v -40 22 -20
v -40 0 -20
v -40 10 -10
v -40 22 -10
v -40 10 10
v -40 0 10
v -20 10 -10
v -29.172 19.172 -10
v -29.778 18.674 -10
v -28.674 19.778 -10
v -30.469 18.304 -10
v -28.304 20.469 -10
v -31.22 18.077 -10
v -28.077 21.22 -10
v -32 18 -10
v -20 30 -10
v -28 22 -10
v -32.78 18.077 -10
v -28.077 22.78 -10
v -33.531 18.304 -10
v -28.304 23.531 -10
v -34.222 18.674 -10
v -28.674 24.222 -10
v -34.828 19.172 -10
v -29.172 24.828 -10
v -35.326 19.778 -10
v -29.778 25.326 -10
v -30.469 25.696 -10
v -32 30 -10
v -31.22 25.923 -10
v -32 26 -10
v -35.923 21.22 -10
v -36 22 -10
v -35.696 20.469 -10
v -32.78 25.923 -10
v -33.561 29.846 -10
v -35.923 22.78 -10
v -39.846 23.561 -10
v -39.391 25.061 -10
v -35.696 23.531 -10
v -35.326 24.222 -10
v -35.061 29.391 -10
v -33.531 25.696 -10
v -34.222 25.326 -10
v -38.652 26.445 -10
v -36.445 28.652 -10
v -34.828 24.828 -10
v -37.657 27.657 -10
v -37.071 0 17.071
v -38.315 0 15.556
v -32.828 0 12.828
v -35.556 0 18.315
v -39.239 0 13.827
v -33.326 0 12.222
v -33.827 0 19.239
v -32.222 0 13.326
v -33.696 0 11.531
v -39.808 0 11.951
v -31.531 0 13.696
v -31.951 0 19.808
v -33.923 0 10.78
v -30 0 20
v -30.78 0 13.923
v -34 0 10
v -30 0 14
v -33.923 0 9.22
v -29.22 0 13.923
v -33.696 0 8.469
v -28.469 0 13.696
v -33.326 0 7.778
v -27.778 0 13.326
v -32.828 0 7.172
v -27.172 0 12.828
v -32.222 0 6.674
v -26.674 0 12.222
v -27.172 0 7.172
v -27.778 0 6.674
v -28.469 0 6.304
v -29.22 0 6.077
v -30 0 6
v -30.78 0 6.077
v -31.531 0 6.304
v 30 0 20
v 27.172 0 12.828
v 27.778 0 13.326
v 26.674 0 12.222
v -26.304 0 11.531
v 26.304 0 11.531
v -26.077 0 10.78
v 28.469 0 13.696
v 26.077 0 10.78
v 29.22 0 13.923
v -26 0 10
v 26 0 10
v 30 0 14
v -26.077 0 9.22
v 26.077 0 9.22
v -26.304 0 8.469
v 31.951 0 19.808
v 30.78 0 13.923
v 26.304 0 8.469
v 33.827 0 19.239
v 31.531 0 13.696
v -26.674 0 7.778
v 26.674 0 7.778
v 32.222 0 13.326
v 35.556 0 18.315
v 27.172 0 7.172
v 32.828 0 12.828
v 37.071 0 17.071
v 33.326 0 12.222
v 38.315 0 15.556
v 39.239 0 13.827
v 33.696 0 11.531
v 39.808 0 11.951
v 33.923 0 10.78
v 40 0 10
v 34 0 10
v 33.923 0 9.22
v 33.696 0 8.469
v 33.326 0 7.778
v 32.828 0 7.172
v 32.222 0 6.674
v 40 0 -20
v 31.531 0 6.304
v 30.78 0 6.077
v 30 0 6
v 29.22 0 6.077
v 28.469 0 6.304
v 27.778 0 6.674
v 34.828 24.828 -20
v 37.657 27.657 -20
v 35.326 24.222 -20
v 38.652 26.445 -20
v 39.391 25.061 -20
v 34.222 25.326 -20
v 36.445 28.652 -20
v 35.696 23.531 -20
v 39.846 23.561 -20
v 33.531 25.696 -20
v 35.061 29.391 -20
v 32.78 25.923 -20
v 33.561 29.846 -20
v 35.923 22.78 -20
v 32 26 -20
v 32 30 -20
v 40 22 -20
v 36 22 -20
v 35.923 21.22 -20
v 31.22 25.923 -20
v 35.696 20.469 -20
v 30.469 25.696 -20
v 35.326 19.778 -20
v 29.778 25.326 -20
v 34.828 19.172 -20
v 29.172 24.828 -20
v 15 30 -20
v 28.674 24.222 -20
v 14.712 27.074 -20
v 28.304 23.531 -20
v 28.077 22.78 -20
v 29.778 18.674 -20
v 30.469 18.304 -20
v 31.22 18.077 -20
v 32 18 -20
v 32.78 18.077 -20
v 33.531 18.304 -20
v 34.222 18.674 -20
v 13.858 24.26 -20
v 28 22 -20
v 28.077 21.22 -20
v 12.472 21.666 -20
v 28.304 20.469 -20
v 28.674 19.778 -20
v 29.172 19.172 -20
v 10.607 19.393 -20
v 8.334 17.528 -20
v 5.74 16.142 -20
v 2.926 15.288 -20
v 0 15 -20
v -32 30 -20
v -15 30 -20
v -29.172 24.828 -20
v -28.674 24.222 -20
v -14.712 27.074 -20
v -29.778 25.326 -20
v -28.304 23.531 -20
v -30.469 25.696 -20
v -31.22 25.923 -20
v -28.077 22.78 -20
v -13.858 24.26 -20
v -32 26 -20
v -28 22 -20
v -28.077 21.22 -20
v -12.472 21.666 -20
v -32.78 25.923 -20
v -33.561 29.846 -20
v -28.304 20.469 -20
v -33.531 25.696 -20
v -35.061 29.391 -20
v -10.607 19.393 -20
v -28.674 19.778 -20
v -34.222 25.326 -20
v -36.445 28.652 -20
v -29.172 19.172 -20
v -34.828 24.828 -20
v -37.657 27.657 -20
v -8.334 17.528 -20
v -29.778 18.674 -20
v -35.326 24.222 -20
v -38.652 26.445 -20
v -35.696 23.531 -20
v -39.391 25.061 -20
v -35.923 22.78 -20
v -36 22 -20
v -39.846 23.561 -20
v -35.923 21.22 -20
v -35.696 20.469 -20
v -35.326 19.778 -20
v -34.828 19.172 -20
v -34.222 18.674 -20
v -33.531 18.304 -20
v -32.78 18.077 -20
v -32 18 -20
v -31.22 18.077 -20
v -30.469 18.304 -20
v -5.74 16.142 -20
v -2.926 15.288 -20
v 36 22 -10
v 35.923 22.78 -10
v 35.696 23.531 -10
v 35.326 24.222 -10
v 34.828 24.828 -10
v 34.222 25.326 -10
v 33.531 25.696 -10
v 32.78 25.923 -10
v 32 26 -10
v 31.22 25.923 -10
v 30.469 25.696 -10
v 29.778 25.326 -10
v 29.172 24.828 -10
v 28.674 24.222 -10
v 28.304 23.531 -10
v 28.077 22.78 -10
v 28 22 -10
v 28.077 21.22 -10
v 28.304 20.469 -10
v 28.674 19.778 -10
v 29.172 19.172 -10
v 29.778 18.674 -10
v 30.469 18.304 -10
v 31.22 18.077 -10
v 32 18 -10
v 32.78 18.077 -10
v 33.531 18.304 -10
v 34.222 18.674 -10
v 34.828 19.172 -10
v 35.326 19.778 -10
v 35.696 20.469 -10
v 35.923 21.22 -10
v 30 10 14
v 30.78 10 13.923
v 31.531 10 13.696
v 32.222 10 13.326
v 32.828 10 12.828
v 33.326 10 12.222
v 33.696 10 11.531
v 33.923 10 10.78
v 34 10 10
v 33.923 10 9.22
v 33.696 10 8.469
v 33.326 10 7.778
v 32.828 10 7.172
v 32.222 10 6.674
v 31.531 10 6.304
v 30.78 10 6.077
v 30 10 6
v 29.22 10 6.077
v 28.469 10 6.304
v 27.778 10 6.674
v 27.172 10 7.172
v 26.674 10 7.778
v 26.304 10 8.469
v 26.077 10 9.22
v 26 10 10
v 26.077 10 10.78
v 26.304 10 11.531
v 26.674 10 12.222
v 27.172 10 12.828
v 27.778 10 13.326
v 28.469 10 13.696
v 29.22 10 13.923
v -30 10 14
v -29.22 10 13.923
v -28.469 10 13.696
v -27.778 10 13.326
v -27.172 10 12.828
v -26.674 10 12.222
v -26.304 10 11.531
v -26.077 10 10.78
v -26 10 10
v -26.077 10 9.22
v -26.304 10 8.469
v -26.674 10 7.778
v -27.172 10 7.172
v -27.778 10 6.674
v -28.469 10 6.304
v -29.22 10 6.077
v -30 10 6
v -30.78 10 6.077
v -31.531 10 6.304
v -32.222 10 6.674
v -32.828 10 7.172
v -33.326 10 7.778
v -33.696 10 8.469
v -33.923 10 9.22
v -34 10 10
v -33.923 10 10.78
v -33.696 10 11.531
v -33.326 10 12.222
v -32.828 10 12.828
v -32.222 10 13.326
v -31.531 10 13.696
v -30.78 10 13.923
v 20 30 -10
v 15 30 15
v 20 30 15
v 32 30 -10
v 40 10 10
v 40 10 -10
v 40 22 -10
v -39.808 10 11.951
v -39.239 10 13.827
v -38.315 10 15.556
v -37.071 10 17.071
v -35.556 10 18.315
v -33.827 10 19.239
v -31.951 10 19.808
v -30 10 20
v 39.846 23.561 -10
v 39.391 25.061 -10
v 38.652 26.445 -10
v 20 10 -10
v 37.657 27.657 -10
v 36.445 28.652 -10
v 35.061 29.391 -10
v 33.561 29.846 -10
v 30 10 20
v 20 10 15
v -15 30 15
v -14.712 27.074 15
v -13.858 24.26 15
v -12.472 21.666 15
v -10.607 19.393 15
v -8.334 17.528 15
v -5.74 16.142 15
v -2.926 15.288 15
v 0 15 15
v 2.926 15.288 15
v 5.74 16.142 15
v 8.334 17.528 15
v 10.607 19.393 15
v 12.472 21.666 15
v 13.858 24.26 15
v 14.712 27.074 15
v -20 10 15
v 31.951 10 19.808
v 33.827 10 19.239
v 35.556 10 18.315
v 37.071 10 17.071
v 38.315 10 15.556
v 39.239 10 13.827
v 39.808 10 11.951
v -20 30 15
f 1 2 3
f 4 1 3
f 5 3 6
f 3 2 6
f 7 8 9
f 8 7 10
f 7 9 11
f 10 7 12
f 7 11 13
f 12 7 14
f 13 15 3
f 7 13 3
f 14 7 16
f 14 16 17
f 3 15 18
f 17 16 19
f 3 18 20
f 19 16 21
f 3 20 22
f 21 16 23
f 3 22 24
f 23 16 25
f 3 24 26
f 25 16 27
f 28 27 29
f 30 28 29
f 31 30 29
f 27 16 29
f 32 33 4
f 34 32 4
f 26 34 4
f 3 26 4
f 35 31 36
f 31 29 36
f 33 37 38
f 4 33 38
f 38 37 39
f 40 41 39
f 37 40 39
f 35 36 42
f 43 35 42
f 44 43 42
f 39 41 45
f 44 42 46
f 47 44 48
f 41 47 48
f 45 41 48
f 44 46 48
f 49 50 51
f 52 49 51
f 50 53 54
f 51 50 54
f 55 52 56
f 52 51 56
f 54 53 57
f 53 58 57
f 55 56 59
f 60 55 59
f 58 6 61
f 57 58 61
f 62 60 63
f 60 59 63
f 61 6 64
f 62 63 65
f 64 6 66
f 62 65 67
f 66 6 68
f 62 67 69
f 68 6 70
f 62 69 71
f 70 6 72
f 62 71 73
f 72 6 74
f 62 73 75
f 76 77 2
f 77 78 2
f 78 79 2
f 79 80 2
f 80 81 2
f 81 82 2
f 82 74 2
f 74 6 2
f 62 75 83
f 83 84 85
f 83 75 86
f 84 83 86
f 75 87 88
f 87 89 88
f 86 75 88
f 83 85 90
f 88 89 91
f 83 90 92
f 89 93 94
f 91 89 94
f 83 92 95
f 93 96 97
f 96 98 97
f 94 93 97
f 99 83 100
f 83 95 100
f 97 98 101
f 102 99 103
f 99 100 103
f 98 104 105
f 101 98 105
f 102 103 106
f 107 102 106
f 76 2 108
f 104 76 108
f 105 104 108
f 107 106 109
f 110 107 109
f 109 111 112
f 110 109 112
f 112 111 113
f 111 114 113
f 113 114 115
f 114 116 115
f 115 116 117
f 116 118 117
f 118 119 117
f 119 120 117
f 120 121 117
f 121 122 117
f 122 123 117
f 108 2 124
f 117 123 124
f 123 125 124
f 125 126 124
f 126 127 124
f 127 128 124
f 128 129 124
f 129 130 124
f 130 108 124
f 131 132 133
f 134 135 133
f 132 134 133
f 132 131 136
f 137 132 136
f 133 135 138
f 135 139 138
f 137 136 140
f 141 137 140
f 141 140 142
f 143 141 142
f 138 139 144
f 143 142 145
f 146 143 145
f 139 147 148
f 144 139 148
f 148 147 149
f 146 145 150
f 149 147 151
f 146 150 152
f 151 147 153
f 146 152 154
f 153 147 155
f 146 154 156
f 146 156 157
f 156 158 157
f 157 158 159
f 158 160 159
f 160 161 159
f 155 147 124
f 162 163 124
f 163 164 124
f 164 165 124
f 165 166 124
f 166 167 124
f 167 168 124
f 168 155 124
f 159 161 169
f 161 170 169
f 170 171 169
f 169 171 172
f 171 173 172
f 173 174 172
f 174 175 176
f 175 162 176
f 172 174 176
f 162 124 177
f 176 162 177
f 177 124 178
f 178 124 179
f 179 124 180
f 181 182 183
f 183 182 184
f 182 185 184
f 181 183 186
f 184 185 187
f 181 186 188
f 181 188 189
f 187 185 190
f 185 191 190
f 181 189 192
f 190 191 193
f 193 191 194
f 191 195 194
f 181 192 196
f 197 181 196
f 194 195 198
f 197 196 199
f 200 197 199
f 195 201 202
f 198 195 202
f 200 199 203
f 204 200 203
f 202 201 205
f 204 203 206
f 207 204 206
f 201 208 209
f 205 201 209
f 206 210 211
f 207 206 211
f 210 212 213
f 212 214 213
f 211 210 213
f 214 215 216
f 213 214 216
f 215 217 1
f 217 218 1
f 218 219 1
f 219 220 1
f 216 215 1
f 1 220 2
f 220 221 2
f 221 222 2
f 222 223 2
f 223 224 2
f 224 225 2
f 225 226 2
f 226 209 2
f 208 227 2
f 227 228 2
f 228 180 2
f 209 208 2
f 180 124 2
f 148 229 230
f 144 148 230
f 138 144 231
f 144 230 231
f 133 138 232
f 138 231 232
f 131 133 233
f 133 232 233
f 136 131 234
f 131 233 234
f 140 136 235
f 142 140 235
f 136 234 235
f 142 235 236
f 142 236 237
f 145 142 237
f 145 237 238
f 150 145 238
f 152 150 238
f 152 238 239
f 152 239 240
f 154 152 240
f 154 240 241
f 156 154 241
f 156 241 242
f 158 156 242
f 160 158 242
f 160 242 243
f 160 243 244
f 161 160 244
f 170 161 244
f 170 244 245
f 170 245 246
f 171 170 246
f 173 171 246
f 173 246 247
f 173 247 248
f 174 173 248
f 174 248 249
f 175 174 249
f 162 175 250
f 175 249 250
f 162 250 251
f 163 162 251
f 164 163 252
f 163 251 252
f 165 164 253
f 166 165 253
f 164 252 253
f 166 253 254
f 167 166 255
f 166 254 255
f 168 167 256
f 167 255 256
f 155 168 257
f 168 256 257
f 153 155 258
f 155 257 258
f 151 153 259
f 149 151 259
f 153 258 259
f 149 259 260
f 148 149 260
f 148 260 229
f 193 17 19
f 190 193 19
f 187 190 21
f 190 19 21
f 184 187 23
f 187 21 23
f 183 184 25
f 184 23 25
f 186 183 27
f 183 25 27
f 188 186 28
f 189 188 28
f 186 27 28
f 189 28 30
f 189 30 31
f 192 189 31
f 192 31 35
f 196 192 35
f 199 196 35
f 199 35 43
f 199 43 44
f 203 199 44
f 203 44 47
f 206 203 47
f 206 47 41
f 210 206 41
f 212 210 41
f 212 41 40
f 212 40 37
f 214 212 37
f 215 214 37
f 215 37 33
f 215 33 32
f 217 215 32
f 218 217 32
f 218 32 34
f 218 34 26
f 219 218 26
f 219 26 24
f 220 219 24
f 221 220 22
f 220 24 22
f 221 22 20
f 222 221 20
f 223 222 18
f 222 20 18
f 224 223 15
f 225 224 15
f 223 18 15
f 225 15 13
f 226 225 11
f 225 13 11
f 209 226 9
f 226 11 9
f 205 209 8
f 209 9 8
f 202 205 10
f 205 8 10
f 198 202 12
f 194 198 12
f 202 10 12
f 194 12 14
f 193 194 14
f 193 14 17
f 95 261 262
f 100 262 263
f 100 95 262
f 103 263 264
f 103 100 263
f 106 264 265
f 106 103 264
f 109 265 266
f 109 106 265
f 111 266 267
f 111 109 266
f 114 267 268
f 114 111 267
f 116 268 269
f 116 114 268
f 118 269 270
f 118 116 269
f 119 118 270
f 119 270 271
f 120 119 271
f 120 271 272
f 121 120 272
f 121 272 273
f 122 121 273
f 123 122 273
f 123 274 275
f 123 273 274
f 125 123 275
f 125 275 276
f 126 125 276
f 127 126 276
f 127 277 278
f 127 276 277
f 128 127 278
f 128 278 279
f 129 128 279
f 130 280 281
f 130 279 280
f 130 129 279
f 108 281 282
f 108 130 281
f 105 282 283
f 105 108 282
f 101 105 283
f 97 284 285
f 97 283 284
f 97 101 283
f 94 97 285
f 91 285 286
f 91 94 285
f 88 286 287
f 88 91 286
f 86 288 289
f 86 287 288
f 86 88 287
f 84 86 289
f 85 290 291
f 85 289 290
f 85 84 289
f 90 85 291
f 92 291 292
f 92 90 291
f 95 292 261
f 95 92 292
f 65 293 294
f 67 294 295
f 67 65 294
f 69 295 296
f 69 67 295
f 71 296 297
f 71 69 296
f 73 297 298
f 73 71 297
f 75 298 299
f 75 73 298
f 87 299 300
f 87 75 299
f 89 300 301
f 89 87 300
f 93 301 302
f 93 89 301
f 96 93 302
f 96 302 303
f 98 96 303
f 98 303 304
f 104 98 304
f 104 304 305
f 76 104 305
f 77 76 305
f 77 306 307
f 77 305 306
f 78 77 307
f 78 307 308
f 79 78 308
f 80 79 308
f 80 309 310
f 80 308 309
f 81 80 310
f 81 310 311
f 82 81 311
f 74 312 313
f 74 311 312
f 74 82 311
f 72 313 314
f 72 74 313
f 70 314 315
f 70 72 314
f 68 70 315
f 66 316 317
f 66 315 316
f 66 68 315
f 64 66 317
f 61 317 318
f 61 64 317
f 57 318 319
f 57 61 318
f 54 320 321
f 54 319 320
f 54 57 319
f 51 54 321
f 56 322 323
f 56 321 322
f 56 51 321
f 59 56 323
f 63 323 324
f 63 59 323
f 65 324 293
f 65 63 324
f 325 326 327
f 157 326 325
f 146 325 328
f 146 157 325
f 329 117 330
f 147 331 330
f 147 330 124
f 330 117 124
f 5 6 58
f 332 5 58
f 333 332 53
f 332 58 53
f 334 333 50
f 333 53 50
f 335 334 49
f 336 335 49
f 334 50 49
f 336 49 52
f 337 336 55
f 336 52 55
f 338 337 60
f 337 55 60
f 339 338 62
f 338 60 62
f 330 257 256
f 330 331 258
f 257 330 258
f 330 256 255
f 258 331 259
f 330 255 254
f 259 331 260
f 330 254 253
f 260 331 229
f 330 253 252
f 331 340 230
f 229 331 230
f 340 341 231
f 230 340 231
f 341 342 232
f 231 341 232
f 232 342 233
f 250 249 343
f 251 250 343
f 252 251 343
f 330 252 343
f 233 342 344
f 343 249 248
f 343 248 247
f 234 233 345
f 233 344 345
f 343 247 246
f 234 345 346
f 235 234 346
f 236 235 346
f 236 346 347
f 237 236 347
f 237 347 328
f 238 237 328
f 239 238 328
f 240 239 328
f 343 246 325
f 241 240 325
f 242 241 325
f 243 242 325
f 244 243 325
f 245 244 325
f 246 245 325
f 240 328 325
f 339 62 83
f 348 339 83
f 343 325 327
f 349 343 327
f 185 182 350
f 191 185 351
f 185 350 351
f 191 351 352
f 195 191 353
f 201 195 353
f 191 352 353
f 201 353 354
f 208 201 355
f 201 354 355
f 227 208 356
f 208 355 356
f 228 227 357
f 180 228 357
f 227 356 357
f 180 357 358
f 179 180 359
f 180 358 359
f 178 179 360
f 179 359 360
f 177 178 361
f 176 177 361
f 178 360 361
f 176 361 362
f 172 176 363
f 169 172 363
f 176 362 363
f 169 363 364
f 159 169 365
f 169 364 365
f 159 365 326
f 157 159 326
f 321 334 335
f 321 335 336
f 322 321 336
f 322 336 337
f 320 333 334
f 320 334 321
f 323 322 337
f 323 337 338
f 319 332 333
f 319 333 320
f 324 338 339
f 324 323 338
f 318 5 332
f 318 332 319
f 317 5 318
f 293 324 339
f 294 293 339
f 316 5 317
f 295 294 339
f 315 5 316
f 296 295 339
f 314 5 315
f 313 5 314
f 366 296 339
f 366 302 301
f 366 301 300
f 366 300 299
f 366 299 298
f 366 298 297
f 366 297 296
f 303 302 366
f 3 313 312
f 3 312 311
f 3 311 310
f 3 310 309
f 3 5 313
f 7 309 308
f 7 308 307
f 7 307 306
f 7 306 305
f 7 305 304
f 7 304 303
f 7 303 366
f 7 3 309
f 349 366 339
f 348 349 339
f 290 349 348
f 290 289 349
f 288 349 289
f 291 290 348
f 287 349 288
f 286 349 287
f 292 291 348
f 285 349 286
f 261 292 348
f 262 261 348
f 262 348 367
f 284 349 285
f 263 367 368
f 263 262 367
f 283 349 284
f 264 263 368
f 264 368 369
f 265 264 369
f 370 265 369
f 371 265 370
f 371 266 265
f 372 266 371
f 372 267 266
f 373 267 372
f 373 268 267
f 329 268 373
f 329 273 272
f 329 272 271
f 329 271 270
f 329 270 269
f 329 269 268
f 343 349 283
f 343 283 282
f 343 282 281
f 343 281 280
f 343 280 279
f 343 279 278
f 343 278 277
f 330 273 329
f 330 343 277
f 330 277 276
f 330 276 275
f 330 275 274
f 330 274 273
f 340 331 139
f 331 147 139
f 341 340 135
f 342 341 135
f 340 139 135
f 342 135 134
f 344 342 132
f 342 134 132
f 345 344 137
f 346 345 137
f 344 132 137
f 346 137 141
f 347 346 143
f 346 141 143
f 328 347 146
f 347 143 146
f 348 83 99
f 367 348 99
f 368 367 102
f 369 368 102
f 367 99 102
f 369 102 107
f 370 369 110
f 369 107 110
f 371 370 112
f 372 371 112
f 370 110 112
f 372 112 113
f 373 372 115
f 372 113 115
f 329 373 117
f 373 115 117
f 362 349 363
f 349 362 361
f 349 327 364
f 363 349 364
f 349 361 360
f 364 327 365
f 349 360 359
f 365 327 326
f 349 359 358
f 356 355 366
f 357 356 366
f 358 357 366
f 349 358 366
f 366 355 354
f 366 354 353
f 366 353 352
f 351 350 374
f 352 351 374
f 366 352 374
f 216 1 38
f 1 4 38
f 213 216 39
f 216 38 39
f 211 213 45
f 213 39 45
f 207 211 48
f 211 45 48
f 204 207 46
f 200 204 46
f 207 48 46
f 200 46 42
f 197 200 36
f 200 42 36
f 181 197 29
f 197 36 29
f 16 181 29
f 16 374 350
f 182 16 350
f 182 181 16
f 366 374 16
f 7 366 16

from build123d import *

# Parameters (mm, degrees)
SKETCH_1_R          = 4
EXTRUDE_1_DEPTH     = 30
CUT_EXTRUDE_1_DEPTH = 20
FILLET_1_R          = 8
SKETCH_3_R          = 4
CUT_EXTRUDE_2_DEPTH = 41


with BuildPart() as part:
    # 스케치1 → 보스-돌출1 (new body)
    with BuildSketch(Plane(origin=(0, 0, 0), x_dir=(1, 0, 0), z_dir=(0, 1, 0))):
        with BuildLine():
            Line((-30, -20), (30, -20))
            ThreePointArc((30, -20), (37.071067812, -17.071067812), (40, -10))
            Line((40, -10), (40, 20))
            Line((40, 20), (-40, 20))
            Line((-40, 20), (-40, -10))
            ThreePointArc((-40, -10), (-37.071067812, -17.071067812), (-30, -20))
        make_face()
        with Locations(Location((-30, -10, 0), (0, 0, 270))):  # turned: the seam where the file's is
            Circle(SKETCH_1_R, mode=Mode.SUBTRACT)
        with Locations(Location((30, -10, 0), (0, 0, 270))):  # turned: the seam where the file's is
            Circle(SKETCH_1_R, mode=Mode.SUBTRACT)
    extrude(amount=EXTRUDE_1_DEPTH)

    # 스케치2 → 컷-돌출1 (cut)
    with BuildSketch(Plane(origin=(0, 30, 0), x_dir=(1, 0, 0), z_dir=(0, 1, 0))):
        with BuildLine():
            Line((40, -10), (40, 10))
            Line((40, 10), (20, 10))
            Line((20, 10), (20, -15))
            Line((20, -15), (-20, -15))
            Line((-20, -15), (-20, 10))
            Line((-20, 10), (-40, 10))
            Line((-40, 10), (-40, -10))
            ThreePointArc((-40, -10), (-37.071067812, -17.071067812), (-30, -20))
            Line((-30, -20), (30, -20))
            ThreePointArc((30, -20), (37.071067812, -17.071067812), (40, -10))
        make_face()
    extrude(amount=-CUT_EXTRUDE_1_DEPTH, mode=Mode.SUBTRACT)

    # 필렛1
    fillet_1_edges = [part.edges().sort_by_distance(p)[0] for p in [
        (-40, 30, -15),
        (40, 30, -15),
    ]]
    fillet(fillet_1_edges, radius=FILLET_1_R)

    # 스케치3 → 컷-돌출2 (cut, through all)
    with BuildSketch(Plane.XY.offset(20)):
        with Locations((-32, 22)):
            Circle(SKETCH_3_R)
        with Locations((32, 22)):
            Circle(SKETCH_3_R)
        with BuildLine():
            Line((15, 30), (-15, 30))
            ThreePointArc((-15, 30), (0, 15), (15, 30))
        make_face()
    extrude(amount=-CUT_EXTRUDE_2_DEPTH, mode=Mode.SUBTRACT)


solid = part.part
